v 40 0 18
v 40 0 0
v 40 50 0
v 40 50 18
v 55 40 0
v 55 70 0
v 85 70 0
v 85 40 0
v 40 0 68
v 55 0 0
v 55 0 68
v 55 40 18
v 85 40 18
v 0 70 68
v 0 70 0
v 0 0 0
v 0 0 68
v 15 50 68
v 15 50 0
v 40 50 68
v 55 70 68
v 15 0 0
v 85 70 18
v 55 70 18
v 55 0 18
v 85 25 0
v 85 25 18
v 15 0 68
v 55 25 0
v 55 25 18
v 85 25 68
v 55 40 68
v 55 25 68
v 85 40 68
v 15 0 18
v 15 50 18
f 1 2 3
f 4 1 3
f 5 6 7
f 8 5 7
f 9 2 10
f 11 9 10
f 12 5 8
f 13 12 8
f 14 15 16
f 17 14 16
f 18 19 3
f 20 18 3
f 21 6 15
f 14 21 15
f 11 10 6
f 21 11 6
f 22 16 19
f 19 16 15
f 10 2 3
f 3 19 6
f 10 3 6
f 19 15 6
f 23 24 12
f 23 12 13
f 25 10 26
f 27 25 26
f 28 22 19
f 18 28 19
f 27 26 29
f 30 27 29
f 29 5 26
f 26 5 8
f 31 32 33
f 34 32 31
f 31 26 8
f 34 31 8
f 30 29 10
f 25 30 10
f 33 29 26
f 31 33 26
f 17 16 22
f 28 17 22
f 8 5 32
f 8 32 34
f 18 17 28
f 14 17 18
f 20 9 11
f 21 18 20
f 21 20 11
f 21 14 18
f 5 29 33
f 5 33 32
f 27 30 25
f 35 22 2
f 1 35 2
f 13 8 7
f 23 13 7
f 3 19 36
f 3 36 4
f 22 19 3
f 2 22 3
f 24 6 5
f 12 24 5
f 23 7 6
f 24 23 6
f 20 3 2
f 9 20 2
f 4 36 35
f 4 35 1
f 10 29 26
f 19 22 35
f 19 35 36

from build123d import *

# Parameters (mm, degrees)
F0_W     = 25
F0_H     = 50
F1_DEPTH = 18
F0_W_2   = 15
F0_H_2   = 20
F2_DEPTH = 68
F4_W     = 30
F4_H     = 15
F5_DEPTH = 68


with BuildPart() as f1:
    # F0 (on Top) → F1 (new body)
    with BuildSketch(Plane.XY):
        with Locations((27.5, 25)):
            Rectangle(F0_W, F0_H)
        Polygon((55, 25), (55, 0), (85, 25), align=None)
        Polygon((85, 70), (55, 70), (55, 40), (85, 40), (85, 55), align=None)
    extrude(amount=F1_DEPTH)


with BuildPart() as f2:
    # F0 (on Top) → F2 (new body)
    with BuildSketch(Plane.XY):
        Polygon((15, 70), (15, 50), (40, 50), (40, 0), (55, 0), (55, 25), (55, 40), (55, 70), align=None)
        with Locations((7.5, 25)):
            Rectangle(F0_W_2, F0_H)
        with Locations((7.5, 60)):
            Rectangle(F0_W_2, F0_H_2)
    extrude(amount=F2_DEPTH)


with BuildPart() as f5:
    # F4 (on face) → F5 (new body)
    with BuildSketch(Plane.XY):
        with Locations((70, 32.5)):
            Rectangle(F4_W, F4_H)
    extrude(amount=F5_DEPTH)


solid = Compound([f1.part, f2.part, f5.part])
